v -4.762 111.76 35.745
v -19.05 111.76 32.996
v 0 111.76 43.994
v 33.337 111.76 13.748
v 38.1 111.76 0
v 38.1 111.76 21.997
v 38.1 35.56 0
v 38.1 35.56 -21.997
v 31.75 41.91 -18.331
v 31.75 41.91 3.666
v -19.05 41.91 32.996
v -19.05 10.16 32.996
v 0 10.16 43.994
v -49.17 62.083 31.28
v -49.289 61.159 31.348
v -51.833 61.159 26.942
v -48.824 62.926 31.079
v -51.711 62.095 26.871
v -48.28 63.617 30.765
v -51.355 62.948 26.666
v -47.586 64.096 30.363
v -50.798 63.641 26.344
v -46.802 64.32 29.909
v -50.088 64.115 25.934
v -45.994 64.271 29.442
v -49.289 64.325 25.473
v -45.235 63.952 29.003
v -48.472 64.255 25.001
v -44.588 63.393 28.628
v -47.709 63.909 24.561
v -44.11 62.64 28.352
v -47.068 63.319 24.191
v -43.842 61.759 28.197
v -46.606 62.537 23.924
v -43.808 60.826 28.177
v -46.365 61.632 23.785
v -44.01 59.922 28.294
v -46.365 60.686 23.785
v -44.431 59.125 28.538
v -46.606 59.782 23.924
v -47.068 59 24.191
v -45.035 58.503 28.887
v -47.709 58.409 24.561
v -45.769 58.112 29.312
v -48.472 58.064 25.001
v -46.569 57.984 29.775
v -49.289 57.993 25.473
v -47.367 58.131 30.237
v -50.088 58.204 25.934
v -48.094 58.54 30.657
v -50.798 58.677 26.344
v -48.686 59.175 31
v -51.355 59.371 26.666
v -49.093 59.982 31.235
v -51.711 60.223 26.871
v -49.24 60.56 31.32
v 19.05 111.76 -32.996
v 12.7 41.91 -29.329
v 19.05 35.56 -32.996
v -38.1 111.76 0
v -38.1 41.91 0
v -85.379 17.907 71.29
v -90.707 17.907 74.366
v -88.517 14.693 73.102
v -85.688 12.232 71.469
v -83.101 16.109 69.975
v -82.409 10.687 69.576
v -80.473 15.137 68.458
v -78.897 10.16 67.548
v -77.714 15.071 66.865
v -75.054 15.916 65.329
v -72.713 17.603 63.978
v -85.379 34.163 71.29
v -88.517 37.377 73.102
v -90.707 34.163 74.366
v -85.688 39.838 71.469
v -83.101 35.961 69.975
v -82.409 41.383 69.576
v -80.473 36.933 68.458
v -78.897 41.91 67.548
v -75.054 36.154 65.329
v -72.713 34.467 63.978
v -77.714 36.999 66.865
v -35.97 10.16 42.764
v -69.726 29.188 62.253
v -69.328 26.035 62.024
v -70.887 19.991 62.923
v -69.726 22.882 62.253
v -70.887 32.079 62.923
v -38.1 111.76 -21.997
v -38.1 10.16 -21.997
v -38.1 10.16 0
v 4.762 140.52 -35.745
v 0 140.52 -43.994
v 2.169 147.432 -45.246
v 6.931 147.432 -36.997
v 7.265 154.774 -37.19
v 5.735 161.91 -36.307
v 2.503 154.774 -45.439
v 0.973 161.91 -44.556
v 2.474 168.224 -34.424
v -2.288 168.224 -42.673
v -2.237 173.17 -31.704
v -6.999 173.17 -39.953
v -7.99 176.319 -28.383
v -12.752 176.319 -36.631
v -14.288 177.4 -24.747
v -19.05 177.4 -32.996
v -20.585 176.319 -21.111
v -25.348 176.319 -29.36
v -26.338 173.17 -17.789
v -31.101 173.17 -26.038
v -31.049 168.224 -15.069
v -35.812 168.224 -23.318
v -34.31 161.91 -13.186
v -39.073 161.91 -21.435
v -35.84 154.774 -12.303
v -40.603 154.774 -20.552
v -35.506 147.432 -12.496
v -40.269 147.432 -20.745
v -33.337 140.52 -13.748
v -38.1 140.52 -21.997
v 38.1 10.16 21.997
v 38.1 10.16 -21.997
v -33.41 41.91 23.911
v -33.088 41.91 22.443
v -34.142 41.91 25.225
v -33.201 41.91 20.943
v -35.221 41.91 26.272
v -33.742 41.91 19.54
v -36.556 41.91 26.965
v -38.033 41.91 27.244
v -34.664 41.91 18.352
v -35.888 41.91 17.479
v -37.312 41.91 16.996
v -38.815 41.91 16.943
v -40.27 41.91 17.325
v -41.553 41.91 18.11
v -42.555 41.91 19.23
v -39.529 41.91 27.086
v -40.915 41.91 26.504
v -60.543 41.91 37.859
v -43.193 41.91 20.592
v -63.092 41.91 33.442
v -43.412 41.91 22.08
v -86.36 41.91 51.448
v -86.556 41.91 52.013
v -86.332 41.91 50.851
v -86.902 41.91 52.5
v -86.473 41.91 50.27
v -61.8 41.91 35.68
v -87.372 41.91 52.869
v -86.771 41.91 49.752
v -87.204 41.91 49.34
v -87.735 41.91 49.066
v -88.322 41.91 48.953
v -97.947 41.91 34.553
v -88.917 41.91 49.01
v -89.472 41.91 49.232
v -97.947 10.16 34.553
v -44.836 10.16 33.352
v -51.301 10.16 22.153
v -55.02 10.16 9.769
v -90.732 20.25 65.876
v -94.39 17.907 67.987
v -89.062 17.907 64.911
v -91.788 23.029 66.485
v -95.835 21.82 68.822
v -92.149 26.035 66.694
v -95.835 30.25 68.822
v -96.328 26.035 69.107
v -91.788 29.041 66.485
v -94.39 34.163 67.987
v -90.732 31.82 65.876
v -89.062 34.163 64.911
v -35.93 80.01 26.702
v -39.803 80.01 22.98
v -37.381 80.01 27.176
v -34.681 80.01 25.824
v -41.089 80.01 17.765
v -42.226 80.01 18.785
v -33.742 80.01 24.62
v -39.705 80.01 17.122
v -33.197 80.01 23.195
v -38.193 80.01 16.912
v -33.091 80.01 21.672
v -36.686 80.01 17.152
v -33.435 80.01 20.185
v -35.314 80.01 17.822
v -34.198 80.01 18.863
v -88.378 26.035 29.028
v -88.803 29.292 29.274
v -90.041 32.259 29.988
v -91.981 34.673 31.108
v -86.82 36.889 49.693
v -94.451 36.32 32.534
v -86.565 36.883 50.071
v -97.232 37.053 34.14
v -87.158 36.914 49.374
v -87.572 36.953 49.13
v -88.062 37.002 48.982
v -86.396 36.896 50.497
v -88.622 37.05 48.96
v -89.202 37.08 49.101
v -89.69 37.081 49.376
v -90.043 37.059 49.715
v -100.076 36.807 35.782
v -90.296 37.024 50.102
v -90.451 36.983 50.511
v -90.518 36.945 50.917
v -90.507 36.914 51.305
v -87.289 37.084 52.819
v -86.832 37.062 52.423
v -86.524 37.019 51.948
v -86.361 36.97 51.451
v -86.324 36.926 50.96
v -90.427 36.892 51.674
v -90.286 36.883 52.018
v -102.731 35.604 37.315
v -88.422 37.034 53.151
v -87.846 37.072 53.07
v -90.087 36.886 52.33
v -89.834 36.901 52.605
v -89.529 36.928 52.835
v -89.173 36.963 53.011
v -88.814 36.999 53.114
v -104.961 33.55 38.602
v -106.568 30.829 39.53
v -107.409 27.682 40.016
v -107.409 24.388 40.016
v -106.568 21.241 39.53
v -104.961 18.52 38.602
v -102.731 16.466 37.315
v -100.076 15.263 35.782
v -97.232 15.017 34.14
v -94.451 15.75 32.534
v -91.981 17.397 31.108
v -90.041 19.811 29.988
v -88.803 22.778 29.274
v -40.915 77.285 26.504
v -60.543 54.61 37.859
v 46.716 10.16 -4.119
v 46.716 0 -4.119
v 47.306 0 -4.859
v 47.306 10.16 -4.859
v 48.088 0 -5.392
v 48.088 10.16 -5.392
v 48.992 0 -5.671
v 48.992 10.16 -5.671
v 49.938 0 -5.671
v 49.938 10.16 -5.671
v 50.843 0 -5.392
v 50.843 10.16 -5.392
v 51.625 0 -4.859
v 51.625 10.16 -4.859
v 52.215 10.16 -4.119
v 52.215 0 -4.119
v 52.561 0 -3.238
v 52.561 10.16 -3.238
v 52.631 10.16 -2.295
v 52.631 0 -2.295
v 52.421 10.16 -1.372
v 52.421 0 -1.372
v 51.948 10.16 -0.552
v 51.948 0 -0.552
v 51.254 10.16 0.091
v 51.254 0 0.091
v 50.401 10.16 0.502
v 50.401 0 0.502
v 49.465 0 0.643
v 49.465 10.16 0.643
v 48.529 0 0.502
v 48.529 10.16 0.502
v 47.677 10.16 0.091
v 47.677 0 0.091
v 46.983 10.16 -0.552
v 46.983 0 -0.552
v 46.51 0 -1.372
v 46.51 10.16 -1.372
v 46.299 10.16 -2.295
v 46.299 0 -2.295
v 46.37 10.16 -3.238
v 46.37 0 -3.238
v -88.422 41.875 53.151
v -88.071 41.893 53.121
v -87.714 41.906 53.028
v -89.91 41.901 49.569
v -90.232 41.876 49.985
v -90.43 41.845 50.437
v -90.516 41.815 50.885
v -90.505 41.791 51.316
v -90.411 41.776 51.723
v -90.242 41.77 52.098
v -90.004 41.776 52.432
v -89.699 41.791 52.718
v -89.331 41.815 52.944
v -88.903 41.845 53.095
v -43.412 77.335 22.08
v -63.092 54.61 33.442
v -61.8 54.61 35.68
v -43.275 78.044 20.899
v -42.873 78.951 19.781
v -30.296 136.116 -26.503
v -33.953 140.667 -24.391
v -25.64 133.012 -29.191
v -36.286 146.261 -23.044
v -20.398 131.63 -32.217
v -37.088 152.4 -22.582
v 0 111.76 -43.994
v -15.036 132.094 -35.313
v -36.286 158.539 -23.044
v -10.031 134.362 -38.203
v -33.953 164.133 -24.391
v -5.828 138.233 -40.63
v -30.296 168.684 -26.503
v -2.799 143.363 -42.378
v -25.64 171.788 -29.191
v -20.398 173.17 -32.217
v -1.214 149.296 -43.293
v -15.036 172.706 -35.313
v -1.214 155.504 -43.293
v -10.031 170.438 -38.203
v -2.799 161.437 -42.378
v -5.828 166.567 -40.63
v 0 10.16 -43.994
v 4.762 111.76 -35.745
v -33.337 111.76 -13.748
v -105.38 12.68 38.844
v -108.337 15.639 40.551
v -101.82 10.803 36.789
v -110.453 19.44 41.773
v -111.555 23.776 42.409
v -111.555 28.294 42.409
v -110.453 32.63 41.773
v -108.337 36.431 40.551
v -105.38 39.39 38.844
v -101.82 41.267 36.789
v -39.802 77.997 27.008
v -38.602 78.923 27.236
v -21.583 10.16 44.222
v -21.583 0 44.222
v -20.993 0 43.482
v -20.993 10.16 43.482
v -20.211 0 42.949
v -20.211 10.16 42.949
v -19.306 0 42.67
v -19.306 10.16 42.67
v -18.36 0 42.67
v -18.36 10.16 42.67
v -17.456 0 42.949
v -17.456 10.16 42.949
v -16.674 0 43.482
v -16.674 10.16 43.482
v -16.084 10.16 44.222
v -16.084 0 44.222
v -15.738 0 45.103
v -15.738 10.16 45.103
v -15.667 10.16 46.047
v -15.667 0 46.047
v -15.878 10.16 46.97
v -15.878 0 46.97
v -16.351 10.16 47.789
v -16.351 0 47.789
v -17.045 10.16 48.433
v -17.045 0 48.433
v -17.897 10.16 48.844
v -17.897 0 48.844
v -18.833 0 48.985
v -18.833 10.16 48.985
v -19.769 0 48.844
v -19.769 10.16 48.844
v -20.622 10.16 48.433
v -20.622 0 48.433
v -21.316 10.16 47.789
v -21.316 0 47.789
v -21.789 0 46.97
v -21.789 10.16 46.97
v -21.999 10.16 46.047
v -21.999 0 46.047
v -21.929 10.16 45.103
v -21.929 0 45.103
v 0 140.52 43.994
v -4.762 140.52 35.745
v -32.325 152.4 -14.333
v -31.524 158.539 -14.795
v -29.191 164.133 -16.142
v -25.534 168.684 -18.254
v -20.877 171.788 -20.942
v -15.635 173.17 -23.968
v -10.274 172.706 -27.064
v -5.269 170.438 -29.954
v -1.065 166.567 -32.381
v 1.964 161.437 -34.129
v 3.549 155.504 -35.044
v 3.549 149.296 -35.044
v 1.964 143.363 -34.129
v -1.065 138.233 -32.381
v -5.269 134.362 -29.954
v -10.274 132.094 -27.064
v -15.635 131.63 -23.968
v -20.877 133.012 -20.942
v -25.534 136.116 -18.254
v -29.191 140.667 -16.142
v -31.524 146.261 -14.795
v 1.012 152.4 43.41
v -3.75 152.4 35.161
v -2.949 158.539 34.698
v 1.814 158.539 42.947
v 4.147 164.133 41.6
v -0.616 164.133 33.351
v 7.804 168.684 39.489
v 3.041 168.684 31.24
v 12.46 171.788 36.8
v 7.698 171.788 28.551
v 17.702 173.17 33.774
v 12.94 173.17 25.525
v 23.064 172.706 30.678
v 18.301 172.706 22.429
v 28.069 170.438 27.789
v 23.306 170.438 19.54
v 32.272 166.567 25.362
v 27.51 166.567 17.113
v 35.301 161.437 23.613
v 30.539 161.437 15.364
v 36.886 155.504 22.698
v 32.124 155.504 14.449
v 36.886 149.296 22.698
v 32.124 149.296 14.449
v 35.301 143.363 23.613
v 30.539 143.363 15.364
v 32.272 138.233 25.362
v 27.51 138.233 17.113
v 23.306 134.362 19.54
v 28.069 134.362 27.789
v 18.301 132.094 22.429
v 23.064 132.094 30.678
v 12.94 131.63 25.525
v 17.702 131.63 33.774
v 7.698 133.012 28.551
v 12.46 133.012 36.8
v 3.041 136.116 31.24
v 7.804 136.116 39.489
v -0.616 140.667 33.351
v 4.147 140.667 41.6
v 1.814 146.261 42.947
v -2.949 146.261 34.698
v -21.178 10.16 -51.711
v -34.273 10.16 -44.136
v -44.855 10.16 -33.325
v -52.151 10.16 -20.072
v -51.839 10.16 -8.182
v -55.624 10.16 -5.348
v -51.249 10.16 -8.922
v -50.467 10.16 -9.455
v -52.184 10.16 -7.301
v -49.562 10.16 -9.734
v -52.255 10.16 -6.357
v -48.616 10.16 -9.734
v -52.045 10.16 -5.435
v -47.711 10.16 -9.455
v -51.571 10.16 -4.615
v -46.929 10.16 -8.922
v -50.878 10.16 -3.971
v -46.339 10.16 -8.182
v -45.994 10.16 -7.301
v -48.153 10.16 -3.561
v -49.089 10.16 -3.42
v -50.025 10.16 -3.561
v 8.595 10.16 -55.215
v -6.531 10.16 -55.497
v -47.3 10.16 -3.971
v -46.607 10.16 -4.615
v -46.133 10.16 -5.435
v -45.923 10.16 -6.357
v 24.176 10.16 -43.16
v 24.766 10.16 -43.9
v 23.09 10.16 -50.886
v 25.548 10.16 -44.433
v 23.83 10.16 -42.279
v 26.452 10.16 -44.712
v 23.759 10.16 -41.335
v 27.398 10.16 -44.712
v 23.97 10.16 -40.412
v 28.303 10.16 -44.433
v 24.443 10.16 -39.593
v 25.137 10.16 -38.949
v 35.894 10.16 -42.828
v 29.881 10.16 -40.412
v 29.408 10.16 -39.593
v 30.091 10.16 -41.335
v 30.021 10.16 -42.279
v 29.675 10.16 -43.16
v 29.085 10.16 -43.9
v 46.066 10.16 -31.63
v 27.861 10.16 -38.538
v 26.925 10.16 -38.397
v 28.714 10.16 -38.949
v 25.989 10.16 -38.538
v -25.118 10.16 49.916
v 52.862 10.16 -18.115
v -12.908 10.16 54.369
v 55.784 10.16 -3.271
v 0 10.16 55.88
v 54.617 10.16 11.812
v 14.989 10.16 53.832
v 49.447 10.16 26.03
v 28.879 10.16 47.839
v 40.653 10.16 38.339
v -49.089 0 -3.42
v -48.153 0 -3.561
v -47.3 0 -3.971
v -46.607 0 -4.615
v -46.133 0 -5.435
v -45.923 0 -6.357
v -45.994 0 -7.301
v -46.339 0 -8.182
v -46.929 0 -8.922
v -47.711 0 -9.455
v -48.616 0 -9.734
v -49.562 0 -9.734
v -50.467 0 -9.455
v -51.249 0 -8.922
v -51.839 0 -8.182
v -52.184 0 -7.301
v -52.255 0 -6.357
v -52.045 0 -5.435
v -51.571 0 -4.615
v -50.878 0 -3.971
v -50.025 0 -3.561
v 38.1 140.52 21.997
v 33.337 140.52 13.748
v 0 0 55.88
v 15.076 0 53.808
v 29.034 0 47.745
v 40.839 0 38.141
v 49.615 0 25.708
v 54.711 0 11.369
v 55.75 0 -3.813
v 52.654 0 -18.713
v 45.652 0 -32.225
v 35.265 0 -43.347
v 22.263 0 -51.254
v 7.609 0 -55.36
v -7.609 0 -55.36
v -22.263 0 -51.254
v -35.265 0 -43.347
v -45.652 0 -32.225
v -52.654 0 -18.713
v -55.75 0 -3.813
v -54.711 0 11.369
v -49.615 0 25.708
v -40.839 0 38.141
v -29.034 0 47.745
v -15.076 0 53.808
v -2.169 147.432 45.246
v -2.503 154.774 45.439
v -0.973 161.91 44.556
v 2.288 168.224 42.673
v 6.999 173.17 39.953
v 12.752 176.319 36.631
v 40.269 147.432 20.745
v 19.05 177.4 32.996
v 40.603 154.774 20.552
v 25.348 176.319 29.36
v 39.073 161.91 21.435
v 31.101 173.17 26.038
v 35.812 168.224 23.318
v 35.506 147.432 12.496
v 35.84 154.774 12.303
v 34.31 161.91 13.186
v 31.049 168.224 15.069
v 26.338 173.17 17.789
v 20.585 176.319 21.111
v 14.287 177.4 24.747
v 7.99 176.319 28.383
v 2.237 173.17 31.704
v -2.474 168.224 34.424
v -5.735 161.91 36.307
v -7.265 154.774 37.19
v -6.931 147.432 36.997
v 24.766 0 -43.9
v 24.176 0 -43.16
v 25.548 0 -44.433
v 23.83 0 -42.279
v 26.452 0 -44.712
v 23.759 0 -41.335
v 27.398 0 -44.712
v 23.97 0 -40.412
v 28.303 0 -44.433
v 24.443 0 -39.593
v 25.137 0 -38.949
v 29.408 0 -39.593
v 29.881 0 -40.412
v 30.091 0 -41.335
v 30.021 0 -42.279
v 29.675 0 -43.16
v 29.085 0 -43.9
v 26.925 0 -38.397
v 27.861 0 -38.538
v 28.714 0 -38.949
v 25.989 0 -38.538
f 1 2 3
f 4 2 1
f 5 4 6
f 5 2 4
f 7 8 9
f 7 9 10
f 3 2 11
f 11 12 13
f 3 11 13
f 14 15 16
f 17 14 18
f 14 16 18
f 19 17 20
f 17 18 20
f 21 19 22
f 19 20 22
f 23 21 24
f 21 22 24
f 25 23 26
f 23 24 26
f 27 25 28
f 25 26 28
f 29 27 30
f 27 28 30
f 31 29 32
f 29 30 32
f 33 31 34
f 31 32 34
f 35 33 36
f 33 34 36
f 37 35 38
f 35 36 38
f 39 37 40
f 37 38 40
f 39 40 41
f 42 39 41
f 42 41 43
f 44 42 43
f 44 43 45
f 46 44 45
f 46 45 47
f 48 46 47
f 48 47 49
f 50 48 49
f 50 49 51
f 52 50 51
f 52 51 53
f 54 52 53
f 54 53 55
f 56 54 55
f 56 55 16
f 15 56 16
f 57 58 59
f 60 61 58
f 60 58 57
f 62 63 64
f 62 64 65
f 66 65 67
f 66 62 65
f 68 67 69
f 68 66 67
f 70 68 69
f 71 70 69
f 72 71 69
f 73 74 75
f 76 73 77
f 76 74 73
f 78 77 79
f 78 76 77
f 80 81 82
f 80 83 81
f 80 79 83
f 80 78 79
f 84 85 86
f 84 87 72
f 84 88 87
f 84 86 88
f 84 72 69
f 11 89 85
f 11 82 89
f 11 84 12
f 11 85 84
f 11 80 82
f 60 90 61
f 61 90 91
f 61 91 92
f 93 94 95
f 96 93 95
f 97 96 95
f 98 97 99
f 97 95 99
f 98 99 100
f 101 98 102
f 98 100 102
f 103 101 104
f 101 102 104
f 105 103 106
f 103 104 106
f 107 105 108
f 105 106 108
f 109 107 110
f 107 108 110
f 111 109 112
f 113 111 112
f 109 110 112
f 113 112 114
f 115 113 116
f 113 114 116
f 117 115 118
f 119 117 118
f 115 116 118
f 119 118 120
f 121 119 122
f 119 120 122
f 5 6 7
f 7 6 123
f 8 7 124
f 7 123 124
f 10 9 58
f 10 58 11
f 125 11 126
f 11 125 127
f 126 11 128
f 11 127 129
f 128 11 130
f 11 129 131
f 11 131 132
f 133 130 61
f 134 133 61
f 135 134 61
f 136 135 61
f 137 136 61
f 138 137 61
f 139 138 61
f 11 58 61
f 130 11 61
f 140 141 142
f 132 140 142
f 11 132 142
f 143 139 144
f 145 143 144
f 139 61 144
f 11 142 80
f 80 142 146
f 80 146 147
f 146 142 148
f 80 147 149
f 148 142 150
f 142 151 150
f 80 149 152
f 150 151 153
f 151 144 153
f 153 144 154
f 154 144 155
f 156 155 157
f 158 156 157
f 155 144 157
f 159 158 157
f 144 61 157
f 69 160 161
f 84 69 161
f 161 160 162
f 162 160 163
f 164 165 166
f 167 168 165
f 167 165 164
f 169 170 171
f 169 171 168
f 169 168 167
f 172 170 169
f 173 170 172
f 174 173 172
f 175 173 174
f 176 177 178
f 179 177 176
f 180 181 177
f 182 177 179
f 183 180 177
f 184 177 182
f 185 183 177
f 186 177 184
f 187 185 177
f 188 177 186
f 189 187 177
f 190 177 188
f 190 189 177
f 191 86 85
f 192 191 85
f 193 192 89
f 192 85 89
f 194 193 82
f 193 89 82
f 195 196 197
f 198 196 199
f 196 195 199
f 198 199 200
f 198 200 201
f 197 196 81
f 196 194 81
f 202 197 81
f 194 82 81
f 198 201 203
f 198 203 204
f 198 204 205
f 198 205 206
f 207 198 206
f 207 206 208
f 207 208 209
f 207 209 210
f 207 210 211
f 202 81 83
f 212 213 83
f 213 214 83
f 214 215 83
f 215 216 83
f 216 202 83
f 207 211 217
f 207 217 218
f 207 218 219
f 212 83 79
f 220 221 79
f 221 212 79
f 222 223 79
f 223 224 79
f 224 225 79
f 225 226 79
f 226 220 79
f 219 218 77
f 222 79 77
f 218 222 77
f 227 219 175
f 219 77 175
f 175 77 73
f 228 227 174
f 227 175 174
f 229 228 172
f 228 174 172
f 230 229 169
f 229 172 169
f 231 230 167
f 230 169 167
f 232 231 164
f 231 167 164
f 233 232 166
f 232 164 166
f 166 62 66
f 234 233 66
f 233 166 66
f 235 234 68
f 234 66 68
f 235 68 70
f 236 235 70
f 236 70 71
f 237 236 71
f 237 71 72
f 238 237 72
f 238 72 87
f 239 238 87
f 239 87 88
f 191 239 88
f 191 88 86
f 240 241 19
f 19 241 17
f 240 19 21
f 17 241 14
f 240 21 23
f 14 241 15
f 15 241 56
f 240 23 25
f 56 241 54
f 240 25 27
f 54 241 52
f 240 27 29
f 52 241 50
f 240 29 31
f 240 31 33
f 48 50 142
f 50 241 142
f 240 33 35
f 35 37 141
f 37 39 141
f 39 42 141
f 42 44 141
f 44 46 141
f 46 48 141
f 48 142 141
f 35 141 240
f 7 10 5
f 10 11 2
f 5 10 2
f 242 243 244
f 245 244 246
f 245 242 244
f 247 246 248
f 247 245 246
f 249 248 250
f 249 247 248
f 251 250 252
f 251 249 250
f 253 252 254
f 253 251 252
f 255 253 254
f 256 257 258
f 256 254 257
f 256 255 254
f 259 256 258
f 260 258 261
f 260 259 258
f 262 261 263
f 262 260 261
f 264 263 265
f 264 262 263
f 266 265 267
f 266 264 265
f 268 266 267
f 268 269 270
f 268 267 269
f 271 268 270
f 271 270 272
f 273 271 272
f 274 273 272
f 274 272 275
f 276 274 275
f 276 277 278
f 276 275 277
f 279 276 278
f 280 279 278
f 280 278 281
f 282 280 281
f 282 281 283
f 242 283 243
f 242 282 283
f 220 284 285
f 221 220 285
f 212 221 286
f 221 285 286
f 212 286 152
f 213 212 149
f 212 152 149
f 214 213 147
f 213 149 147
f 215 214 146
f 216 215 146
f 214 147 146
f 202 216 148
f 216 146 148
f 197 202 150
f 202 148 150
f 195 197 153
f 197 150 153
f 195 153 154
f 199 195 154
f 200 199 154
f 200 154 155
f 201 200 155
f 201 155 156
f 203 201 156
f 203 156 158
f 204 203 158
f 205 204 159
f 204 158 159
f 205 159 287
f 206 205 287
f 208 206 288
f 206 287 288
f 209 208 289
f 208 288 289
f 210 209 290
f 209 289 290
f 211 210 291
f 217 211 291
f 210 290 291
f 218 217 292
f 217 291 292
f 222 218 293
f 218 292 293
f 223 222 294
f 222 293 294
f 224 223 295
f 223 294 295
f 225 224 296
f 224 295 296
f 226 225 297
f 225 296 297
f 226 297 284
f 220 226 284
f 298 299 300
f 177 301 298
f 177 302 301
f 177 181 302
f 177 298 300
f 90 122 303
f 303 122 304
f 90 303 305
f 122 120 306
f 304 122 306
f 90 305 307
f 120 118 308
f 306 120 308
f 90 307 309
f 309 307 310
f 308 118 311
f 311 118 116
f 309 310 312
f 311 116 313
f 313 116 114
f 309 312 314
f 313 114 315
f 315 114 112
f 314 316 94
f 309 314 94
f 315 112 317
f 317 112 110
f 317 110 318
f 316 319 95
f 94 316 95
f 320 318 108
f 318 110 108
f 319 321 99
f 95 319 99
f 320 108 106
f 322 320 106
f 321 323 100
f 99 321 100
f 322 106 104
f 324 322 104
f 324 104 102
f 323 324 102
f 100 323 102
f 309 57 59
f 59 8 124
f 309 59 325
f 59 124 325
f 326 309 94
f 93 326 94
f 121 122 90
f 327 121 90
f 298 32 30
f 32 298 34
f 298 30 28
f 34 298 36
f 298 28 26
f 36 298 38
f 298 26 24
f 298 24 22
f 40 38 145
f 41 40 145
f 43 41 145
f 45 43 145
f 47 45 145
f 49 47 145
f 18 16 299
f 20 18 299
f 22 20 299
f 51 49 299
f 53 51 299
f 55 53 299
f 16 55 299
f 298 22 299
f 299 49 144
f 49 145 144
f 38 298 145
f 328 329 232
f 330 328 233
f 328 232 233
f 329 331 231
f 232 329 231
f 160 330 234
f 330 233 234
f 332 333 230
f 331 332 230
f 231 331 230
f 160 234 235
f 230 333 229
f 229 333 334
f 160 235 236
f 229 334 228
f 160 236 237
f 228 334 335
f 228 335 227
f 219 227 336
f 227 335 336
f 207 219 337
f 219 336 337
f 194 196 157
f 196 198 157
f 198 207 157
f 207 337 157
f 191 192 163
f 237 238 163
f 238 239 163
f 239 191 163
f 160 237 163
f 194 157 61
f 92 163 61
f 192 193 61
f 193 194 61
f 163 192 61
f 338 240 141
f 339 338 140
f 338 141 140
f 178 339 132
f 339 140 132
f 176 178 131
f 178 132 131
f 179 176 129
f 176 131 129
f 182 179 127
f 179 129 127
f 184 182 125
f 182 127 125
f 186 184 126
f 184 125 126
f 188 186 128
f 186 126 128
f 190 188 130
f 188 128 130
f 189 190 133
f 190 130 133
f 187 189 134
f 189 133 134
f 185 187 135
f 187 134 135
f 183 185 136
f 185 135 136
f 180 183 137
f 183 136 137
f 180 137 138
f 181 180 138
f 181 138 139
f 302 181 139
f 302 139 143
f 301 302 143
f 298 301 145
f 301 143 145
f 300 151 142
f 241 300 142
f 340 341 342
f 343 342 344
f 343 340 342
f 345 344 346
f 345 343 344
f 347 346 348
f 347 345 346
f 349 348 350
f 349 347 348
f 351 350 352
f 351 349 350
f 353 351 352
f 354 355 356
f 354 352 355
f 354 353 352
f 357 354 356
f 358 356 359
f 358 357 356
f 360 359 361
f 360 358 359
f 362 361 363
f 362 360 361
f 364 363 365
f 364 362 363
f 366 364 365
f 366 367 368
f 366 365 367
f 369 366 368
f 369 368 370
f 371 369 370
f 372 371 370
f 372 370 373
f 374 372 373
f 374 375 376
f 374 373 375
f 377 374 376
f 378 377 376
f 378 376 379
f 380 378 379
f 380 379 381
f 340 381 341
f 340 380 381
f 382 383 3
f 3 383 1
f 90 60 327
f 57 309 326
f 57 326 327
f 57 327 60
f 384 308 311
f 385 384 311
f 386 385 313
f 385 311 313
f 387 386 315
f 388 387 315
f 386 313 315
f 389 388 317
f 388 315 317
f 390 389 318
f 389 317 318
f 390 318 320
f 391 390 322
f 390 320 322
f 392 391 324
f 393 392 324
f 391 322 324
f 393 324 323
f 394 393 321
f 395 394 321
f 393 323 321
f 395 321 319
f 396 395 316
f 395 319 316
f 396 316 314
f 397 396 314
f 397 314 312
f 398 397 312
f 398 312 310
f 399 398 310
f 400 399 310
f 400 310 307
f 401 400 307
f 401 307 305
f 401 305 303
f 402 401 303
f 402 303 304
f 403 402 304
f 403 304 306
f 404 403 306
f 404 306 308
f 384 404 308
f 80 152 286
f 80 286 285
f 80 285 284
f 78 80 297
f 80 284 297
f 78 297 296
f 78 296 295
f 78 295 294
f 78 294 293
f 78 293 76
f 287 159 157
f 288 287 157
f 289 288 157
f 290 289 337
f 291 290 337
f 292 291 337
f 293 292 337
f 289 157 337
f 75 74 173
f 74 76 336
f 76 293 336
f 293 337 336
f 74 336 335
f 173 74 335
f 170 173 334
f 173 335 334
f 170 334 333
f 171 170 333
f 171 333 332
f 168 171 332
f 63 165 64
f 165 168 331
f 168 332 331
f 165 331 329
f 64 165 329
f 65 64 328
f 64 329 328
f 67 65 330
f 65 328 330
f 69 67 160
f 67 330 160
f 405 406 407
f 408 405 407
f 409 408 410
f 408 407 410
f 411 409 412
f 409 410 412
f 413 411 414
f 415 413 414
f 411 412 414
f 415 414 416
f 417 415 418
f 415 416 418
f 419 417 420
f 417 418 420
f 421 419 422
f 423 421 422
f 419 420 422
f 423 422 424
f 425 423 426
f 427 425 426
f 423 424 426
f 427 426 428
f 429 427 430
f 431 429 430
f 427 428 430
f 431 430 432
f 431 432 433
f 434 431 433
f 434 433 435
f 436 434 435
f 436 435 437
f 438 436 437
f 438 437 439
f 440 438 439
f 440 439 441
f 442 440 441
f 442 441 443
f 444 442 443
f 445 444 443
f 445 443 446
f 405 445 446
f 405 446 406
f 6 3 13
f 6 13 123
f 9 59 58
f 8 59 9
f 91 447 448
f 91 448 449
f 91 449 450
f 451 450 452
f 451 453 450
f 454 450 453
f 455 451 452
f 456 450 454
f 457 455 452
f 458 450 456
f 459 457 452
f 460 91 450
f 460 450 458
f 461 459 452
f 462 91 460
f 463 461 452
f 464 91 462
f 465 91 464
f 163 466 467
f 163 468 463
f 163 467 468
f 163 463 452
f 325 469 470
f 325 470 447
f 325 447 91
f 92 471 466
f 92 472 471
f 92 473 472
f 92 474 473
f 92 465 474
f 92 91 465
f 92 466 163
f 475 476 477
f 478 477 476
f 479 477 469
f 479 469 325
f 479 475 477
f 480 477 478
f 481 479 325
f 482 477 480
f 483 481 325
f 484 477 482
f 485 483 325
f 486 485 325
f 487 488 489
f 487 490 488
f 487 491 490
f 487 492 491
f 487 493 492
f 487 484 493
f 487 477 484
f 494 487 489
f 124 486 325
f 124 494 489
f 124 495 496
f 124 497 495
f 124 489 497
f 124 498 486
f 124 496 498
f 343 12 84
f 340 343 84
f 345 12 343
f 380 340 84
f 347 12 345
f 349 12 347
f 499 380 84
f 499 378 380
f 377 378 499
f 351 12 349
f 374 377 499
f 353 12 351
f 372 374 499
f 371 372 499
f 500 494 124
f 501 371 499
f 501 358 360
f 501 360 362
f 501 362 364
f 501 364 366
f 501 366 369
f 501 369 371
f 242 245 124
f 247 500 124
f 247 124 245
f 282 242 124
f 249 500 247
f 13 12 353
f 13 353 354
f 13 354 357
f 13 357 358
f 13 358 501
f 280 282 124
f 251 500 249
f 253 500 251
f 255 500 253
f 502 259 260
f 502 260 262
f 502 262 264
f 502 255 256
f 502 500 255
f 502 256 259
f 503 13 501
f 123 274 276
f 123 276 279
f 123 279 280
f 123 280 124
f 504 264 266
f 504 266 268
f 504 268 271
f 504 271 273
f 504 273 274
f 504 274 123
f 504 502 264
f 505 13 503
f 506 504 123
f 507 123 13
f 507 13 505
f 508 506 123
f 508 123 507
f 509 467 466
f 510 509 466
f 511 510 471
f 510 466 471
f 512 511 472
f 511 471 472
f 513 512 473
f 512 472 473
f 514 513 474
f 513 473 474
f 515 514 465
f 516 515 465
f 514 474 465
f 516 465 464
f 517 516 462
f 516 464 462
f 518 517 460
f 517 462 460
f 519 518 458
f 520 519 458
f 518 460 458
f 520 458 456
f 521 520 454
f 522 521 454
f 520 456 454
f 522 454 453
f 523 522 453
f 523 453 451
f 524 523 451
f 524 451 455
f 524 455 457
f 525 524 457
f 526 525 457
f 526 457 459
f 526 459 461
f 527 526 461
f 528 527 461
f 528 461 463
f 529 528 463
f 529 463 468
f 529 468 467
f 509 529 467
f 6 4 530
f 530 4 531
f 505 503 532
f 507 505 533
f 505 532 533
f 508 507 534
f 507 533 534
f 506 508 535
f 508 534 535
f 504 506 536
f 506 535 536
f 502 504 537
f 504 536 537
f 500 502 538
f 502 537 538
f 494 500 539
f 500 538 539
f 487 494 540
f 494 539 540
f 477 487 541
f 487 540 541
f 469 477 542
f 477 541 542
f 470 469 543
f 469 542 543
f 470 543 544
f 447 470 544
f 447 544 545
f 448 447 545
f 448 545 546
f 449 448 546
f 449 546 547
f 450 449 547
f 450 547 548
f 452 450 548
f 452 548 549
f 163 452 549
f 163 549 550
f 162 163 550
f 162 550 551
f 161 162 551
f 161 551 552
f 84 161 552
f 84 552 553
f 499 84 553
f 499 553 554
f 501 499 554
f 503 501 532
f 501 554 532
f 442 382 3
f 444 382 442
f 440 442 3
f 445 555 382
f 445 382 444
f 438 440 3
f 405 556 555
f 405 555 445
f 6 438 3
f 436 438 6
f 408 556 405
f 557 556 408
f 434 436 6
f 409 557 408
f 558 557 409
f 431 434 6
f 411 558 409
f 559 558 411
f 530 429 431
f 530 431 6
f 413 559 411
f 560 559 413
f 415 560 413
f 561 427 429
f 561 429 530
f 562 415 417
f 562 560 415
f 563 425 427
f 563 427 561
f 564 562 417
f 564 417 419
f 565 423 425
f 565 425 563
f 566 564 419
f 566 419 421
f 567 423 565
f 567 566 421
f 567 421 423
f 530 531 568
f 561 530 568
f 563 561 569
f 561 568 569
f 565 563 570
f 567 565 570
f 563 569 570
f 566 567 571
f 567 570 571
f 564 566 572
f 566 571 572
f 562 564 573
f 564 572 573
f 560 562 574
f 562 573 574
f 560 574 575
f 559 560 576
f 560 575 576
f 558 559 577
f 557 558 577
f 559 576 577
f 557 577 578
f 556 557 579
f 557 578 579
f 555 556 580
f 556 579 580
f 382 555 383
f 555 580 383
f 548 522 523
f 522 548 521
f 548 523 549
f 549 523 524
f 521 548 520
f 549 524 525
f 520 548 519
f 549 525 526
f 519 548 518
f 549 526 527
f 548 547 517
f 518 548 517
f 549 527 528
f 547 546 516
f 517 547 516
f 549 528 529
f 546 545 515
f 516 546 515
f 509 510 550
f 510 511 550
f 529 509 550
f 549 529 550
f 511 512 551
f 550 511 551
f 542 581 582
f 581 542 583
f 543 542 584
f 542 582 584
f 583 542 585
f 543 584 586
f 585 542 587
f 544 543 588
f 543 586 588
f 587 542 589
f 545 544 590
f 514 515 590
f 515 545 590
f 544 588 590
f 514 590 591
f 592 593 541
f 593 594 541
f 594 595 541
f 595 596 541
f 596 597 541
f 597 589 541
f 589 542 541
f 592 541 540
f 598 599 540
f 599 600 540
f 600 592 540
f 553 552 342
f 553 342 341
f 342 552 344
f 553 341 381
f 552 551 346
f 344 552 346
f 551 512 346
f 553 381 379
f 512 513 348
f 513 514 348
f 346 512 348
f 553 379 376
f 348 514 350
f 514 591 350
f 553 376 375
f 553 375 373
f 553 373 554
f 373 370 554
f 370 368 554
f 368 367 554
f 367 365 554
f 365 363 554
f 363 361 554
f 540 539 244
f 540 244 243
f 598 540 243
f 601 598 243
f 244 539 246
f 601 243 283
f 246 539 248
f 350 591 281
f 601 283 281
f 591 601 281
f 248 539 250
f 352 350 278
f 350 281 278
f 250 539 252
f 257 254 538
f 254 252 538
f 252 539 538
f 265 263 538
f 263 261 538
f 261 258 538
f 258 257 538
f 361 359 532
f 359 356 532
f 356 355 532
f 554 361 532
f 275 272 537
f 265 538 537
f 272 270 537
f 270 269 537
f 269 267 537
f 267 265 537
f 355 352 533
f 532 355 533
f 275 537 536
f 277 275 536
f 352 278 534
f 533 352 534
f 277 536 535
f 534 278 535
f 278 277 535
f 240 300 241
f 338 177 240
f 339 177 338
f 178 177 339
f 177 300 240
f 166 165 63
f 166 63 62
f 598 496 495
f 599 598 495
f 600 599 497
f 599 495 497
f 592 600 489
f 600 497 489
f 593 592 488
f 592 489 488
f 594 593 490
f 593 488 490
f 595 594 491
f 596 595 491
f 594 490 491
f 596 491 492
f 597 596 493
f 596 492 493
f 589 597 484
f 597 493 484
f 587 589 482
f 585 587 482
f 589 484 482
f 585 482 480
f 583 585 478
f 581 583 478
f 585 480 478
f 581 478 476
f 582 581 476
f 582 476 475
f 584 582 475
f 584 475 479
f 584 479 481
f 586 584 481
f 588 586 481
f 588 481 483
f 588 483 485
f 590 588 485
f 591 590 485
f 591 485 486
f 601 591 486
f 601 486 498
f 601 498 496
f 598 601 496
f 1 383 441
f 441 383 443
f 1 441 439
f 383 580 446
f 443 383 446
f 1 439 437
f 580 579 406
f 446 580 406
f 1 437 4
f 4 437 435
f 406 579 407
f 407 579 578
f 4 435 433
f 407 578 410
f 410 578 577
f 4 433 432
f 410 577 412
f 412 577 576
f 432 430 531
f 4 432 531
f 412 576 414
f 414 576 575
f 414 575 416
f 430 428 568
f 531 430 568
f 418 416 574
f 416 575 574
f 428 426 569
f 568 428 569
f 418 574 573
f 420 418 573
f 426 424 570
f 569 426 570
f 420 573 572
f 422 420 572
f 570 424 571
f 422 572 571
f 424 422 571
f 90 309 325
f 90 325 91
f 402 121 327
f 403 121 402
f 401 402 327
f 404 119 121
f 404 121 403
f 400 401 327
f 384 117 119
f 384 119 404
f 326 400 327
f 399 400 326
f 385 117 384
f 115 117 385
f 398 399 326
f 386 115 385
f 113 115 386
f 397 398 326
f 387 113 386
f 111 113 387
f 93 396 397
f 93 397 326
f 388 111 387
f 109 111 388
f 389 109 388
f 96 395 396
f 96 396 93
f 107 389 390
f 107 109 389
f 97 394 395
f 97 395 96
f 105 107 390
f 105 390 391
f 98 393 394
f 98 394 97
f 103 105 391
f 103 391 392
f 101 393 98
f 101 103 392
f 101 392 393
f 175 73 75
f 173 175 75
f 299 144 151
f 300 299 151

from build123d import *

# Parameters (mm, degrees)
SKETCH4_R            = 55.88
BOSS_EXTRUDE2_DEPTH  = 10.16
BOSS_EXTRUDE4_DEPTH  = 101.6
BOSS_EXTRUDE5_DEPTH  = 9.525
BOSS_EXTRUDE6_START  = -9.525
BOSS_EXTRUDE6_DEPTH  = 9.525
CUT_EXTRUDE4_REACH   = 214.095
SKETCH12_R           = 20.828
SKETCH13_W           = 38.1
SKETCH13_H           = 69.85
CUT_EXTRUDE5_DEPTH   = 76.2
BOSS_EXTRUDE10_DEPTH = 19.05
SKETCH28_R           = 11.049
CUT_EXTRUDE9_DEPTH   = 38.1
CUT_EXTRUDE10_DEPTH  = 7.366
CHAMFER1_SIZE        = 6.35
SKETCH30_R           = 2.1
CUT_EXTRUDE11_DEPTH  = 7.366
SKETCH31_R           = 3.175
CUT_EXTRUDE12_DEPTH  = 215.41878972
BOSS_EXTRUDE11_DEPTH = 38.1
CHAMFER2_SIZE        = 25.4
CUT_EXTRUDE13_REACH  = 224.549
SKETCH34_R           = 3.175


with BuildPart() as part:
    # Sketch4 → Boss-Extrude2 (new body)
    with BuildSketch(Plane(origin=(0, 0, 0), x_dir=(1, 0, 0), z_dir=(0, 1, 0))):
        with Locations(Location((0, 0, 0), (0, 0, 270))):
            Circle(SKETCH4_R)
    extrude(amount=BOSS_EXTRUDE2_DEPTH)

    # Sketch8 → Boss-Extrude4 (add)
    with BuildSketch(Plane(origin=(0, 10.16, 0), x_dir=(1, 0, 0), z_dir=(0, 1, 0))):
        Polygon((0, 43.994090512), (-38.1, 21.997045256), (-38.1, -21.997045256), (0, -43.994090512), (38.1, -21.997045256), (38.1, 21.997045256), align=None)
    extrude(amount=BOSS_EXTRUDE4_DEPTH)

    # Sketch9 → Boss-Extrude5 (add)
    with BuildSketch(Plane(origin=(-19.05, 0, -32.995567884), x_dir=(-0.8660254037844386, 0, 0.5000000000000003), z_dir=(-0.5000000000000002, 0, -0.8660254037844385))):
        with BuildLine():
            Line((21.997045256, 111.76), (-21.997045256, 111.76))
            Line((-21.997045256, 111.76), (-21.997045256, 140.520185187))
            ThreePointArc((-21.997045256, 140.520185187), (0, 177.4), (21.997045256, 140.520185187))
            Line((21.997045256, 140.520185187), (21.997045256, 111.76))
        make_face()
    extrude(amount=-BOSS_EXTRUDE5_DEPTH)

    # Sketch10 → Boss-Extrude6 (add)
    with BuildSketch(Plane(origin=(19.05, 0, 32.995567884), x_dir=(0.8660254037844386, 0, -0.5000000000000001), z_dir=(0.5000000000000001, 0, 0.8660254037844386)).offset(BOSS_EXTRUDE6_START)):
        with BuildLine():
            Line((-21.997045256, 111.76), (21.997045256, 111.76))
            Line((21.997045256, 111.76), (21.997045256, 140.520185187))
            ThreePointArc((21.997045256, 140.520185187), (0, 177.4), (-21.997045256, 140.520185187))
            Line((-21.997045256, 140.520185187), (-21.997045256, 111.76))
        make_face()
    extrude(amount=BOSS_EXTRUDE6_DEPTH)

    # Cut-Extrude4: up to this face of the body (flat: up to its plane)
    cut_extrude4_end = Plane(part.part.faces().sort_by_distance((19.05, 92.730612225, 32.995567884))[0])
    # Sketch12 → Cut-Extrude4 (cut, up to the picked face)
    with BuildSketch(Plane(origin=(-19.05, 0, -32.995567884), x_dir=(-0.8660254037844386, 0, 0.5000000000000003), z_dir=(-0.5000000000000002, 0, -0.8660254037844385)), mode=Mode.PRIVATE) as cut_extrude4_sk1:
        with Locations((0, 152.4)):
            Circle(SKETCH12_R)
    cut_extrude4_tool1 = split(extrude(cut_extrude4_sk1.sketch, amount=-CUT_EXTRUDE4_REACH, mode=Mode.PRIVATE), bisect_by=cut_extrude4_end, keep=Keep.BOTH, mode=Mode.PRIVATE)
    add(cut_extrude4_tool1.solids().sort_by(Axis((-19.05, 152.4, -32.995568), (0.5000000000000002, 0, 0.8660254037844385)))[0], mode=Mode.SUBTRACT)

    # Sketch13 → Cut-Extrude5 (cut, symmetric)
    with BuildSketch(Plane(origin=(-19.05, 0, 10.998522628), x_dir=(0.5000000000000002, 0, 0.8660254037844386), z_dir=(-0.8660254037844385, 0, 0.5000000000000001))):
        with Locations((0, 76.835)):
            Rectangle(SKETCH13_W, SKETCH13_H)
    extrude(amount=CUT_EXTRUDE5_DEPTH, both=True, mode=Mode.SUBTRACT)

    # Sketch22 → Boss-Extrude10 (add, symmetric)
    with BuildSketch(Plane(origin=(0, 0, 0), x_dir=(-0.8660254037844386, 0, 0.5000000000000001), z_dir=(-0.5000000000000001, 0, -0.8660254037844386))):
        with BuildLine():
            Line((43.994090512, 41.91), (102.10102108, 41.91))
            ThreePointArc((102.10102108, 41.91), (117.97602108, 26.035), (102.10102108, 10.16))
            Line((102.10102108, 10.16), (43.994090512, 10.16))
            Line((43.994090512, 10.16), (21.997045256, 10.16))
            Line((21.997045256, 10.16), (21.997045256, 41.91))
            Line((21.997045256, 41.91), (43.994090512, 41.91))
        make_face()
    extrude(amount=BOSS_EXTRUDE10_DEPTH, both=True)

    # Sketch28 → Cut-Extrude9 (cut)
    with BuildSketch(Plane(origin=(9.525, 0, 16.497783942), x_dir=(0.8660254037844386, 0, -0.5000000000000001), z_dir=(0.5000000000000001, 0, 0.8660254037844386))):
        with Locations((-102.10102108, 26.035)):
            Circle(SKETCH28_R)
    extrude(amount=-CUT_EXTRUDE9_DEPTH, mode=Mode.SUBTRACT)

    # Sketch29 → Cut-Extrude10 (cut)
    with BuildSketch(Plane(origin=(9.525, 0, 16.497783942), x_dir=(0.8660254037844386, 0, -0.5000000000000001), z_dir=(0.5000000000000001, 0, 0.8660254037844386))):
        with BuildLine():
            Line((-115.737415068, 17.907), (-109.585405958, 17.907))
            ThreePointArc((-109.585405958, 17.907), (-113.15002108, 26.035), (-109.585405958, 34.163))
            Line((-109.585405958, 34.163), (-115.737415068, 34.163))
            ThreePointArc((-115.737415068, 34.163), (-117.97602108, 26.035), (-115.737415068, 17.907))
        make_face()
    extrude(amount=-CUT_EXTRUDE10_DEPTH, mode=Mode.SUBTRACT)

    # Chamfer1
    chamfer1_edges = [part.edges().sort_by_distance(p)[0] for p in [
        (38.1, 41.91, -10.998522628),
        (28.575, 41.91, -27.49630657),
    ]]
    chamfer(chamfer1_edges, length=CHAMFER1_SIZE)

    # Sketch30 → Cut-Extrude11 (cut)
    with BuildSketch(Plane(origin=(0, 41.91, 0), x_dir=(1, 0, 0), z_dir=(0, 1, 0))):
        with Locations(Location((-88.422078008, -51.05051054, 0), (0, 0, 270))):
            Circle(SKETCH30_R)
    extrude(amount=-CUT_EXTRUDE11_DEPTH, mode=Mode.SUBTRACT)

    # Sketch31 → Cut-Extrude12 (cut, through all)
    with BuildSketch(Plane(origin=(0, 10.16, 0), x_dir=(1, 0, 0), z_dir=(0, 1, 0))):
        with Locations(Location((-49.089000823, 6.594762938, 0), (0, 0, 270))):
            Circle(SKETCH31_R)
        with Locations(Location((26.925278647, 41.57222955, 0), (0, 0, 270))):
            Circle(SKETCH31_R)
    cut_extrude12 = extrude(amount=-CUT_EXTRUDE12_DEPTH, mode=Mode.SUBTRACT)

    # Mirror1: Cut-Extrude12 across plane
    add(cut_extrude12.mirror(Plane(origin=(0, 0, 0), x_dir=(-0.8660254037844386, 0, 0.5000000000000001), z_dir=(-0.5000000000000001, 0, -0.8660254037844386))), mode=Mode.SUBTRACT)

    # Sketch33 → Boss-Extrude11 (add)
    with BuildSketch(Plane(origin=(0, 41.91, 0), x_dir=(1, 0, 0), z_dir=(0, 1, 0))):
        with BuildLine():
            Line((-43.411916389, -22.079834386), (-63.092428819, -33.442383535))
            Line((-63.092428819, -33.442383535), (-61.800298466, -35.680418955))
            Line((-61.800298466, -35.680418955), (-60.542722832, -37.858603849))
            Line((-60.542722832, -37.858603849), (-40.91541904, -26.504074545))
            ThreePointArc((-40.91541904, -26.504074545), (-33.742060338, -19.539834386), (-43.411916389, -22.079834386))
        make_face()
    extrude(amount=BOSS_EXTRUDE11_DEPTH)

    # Chamfer2
    chamfer2_edges = [part.edges().sort_by_distance(p)[0] for p in [
        (-61.817575825, 80.01, 35.650493692),
    ]]
    chamfer(chamfer2_edges, length=CHAMFER2_SIZE)

    # Cut-Extrude13: up to this plane
    cut_extrude13_end = Plane(origin=(-60.542722832, 80.01, 37.858603849), z_dir=(-0.500750644235671, 0, -0.8655915851587056))
    # Sketch34 → Cut-Extrude13 (cut, up to the surface)
    with BuildSketch(Plane(origin=(-1.292130352, 0, -2.23803542), x_dir=(-0.8660254037844386, 0, 0.5000000000000003), z_dir=(-0.5000000000000002, 0, -0.8660254037844385)), mode=Mode.PRIVATE) as cut_extrude13_sk1:
        with Locations((55.184849848, 61.159110234)):
            Circle(SKETCH34_R)
    cut_extrude13_tool1 = split(extrude(cut_extrude13_sk1.sketch, amount=-CUT_EXTRUDE13_REACH, mode=Mode.PRIVATE), bisect_by=cut_extrude13_end, keep=Keep.BOTH, mode=Mode.PRIVATE)
    add(cut_extrude13_tool1.solids().sort_by_distance((-49.083612, 61.15911, 25.35439))[0], mode=Mode.SUBTRACT)


solid = part.part
